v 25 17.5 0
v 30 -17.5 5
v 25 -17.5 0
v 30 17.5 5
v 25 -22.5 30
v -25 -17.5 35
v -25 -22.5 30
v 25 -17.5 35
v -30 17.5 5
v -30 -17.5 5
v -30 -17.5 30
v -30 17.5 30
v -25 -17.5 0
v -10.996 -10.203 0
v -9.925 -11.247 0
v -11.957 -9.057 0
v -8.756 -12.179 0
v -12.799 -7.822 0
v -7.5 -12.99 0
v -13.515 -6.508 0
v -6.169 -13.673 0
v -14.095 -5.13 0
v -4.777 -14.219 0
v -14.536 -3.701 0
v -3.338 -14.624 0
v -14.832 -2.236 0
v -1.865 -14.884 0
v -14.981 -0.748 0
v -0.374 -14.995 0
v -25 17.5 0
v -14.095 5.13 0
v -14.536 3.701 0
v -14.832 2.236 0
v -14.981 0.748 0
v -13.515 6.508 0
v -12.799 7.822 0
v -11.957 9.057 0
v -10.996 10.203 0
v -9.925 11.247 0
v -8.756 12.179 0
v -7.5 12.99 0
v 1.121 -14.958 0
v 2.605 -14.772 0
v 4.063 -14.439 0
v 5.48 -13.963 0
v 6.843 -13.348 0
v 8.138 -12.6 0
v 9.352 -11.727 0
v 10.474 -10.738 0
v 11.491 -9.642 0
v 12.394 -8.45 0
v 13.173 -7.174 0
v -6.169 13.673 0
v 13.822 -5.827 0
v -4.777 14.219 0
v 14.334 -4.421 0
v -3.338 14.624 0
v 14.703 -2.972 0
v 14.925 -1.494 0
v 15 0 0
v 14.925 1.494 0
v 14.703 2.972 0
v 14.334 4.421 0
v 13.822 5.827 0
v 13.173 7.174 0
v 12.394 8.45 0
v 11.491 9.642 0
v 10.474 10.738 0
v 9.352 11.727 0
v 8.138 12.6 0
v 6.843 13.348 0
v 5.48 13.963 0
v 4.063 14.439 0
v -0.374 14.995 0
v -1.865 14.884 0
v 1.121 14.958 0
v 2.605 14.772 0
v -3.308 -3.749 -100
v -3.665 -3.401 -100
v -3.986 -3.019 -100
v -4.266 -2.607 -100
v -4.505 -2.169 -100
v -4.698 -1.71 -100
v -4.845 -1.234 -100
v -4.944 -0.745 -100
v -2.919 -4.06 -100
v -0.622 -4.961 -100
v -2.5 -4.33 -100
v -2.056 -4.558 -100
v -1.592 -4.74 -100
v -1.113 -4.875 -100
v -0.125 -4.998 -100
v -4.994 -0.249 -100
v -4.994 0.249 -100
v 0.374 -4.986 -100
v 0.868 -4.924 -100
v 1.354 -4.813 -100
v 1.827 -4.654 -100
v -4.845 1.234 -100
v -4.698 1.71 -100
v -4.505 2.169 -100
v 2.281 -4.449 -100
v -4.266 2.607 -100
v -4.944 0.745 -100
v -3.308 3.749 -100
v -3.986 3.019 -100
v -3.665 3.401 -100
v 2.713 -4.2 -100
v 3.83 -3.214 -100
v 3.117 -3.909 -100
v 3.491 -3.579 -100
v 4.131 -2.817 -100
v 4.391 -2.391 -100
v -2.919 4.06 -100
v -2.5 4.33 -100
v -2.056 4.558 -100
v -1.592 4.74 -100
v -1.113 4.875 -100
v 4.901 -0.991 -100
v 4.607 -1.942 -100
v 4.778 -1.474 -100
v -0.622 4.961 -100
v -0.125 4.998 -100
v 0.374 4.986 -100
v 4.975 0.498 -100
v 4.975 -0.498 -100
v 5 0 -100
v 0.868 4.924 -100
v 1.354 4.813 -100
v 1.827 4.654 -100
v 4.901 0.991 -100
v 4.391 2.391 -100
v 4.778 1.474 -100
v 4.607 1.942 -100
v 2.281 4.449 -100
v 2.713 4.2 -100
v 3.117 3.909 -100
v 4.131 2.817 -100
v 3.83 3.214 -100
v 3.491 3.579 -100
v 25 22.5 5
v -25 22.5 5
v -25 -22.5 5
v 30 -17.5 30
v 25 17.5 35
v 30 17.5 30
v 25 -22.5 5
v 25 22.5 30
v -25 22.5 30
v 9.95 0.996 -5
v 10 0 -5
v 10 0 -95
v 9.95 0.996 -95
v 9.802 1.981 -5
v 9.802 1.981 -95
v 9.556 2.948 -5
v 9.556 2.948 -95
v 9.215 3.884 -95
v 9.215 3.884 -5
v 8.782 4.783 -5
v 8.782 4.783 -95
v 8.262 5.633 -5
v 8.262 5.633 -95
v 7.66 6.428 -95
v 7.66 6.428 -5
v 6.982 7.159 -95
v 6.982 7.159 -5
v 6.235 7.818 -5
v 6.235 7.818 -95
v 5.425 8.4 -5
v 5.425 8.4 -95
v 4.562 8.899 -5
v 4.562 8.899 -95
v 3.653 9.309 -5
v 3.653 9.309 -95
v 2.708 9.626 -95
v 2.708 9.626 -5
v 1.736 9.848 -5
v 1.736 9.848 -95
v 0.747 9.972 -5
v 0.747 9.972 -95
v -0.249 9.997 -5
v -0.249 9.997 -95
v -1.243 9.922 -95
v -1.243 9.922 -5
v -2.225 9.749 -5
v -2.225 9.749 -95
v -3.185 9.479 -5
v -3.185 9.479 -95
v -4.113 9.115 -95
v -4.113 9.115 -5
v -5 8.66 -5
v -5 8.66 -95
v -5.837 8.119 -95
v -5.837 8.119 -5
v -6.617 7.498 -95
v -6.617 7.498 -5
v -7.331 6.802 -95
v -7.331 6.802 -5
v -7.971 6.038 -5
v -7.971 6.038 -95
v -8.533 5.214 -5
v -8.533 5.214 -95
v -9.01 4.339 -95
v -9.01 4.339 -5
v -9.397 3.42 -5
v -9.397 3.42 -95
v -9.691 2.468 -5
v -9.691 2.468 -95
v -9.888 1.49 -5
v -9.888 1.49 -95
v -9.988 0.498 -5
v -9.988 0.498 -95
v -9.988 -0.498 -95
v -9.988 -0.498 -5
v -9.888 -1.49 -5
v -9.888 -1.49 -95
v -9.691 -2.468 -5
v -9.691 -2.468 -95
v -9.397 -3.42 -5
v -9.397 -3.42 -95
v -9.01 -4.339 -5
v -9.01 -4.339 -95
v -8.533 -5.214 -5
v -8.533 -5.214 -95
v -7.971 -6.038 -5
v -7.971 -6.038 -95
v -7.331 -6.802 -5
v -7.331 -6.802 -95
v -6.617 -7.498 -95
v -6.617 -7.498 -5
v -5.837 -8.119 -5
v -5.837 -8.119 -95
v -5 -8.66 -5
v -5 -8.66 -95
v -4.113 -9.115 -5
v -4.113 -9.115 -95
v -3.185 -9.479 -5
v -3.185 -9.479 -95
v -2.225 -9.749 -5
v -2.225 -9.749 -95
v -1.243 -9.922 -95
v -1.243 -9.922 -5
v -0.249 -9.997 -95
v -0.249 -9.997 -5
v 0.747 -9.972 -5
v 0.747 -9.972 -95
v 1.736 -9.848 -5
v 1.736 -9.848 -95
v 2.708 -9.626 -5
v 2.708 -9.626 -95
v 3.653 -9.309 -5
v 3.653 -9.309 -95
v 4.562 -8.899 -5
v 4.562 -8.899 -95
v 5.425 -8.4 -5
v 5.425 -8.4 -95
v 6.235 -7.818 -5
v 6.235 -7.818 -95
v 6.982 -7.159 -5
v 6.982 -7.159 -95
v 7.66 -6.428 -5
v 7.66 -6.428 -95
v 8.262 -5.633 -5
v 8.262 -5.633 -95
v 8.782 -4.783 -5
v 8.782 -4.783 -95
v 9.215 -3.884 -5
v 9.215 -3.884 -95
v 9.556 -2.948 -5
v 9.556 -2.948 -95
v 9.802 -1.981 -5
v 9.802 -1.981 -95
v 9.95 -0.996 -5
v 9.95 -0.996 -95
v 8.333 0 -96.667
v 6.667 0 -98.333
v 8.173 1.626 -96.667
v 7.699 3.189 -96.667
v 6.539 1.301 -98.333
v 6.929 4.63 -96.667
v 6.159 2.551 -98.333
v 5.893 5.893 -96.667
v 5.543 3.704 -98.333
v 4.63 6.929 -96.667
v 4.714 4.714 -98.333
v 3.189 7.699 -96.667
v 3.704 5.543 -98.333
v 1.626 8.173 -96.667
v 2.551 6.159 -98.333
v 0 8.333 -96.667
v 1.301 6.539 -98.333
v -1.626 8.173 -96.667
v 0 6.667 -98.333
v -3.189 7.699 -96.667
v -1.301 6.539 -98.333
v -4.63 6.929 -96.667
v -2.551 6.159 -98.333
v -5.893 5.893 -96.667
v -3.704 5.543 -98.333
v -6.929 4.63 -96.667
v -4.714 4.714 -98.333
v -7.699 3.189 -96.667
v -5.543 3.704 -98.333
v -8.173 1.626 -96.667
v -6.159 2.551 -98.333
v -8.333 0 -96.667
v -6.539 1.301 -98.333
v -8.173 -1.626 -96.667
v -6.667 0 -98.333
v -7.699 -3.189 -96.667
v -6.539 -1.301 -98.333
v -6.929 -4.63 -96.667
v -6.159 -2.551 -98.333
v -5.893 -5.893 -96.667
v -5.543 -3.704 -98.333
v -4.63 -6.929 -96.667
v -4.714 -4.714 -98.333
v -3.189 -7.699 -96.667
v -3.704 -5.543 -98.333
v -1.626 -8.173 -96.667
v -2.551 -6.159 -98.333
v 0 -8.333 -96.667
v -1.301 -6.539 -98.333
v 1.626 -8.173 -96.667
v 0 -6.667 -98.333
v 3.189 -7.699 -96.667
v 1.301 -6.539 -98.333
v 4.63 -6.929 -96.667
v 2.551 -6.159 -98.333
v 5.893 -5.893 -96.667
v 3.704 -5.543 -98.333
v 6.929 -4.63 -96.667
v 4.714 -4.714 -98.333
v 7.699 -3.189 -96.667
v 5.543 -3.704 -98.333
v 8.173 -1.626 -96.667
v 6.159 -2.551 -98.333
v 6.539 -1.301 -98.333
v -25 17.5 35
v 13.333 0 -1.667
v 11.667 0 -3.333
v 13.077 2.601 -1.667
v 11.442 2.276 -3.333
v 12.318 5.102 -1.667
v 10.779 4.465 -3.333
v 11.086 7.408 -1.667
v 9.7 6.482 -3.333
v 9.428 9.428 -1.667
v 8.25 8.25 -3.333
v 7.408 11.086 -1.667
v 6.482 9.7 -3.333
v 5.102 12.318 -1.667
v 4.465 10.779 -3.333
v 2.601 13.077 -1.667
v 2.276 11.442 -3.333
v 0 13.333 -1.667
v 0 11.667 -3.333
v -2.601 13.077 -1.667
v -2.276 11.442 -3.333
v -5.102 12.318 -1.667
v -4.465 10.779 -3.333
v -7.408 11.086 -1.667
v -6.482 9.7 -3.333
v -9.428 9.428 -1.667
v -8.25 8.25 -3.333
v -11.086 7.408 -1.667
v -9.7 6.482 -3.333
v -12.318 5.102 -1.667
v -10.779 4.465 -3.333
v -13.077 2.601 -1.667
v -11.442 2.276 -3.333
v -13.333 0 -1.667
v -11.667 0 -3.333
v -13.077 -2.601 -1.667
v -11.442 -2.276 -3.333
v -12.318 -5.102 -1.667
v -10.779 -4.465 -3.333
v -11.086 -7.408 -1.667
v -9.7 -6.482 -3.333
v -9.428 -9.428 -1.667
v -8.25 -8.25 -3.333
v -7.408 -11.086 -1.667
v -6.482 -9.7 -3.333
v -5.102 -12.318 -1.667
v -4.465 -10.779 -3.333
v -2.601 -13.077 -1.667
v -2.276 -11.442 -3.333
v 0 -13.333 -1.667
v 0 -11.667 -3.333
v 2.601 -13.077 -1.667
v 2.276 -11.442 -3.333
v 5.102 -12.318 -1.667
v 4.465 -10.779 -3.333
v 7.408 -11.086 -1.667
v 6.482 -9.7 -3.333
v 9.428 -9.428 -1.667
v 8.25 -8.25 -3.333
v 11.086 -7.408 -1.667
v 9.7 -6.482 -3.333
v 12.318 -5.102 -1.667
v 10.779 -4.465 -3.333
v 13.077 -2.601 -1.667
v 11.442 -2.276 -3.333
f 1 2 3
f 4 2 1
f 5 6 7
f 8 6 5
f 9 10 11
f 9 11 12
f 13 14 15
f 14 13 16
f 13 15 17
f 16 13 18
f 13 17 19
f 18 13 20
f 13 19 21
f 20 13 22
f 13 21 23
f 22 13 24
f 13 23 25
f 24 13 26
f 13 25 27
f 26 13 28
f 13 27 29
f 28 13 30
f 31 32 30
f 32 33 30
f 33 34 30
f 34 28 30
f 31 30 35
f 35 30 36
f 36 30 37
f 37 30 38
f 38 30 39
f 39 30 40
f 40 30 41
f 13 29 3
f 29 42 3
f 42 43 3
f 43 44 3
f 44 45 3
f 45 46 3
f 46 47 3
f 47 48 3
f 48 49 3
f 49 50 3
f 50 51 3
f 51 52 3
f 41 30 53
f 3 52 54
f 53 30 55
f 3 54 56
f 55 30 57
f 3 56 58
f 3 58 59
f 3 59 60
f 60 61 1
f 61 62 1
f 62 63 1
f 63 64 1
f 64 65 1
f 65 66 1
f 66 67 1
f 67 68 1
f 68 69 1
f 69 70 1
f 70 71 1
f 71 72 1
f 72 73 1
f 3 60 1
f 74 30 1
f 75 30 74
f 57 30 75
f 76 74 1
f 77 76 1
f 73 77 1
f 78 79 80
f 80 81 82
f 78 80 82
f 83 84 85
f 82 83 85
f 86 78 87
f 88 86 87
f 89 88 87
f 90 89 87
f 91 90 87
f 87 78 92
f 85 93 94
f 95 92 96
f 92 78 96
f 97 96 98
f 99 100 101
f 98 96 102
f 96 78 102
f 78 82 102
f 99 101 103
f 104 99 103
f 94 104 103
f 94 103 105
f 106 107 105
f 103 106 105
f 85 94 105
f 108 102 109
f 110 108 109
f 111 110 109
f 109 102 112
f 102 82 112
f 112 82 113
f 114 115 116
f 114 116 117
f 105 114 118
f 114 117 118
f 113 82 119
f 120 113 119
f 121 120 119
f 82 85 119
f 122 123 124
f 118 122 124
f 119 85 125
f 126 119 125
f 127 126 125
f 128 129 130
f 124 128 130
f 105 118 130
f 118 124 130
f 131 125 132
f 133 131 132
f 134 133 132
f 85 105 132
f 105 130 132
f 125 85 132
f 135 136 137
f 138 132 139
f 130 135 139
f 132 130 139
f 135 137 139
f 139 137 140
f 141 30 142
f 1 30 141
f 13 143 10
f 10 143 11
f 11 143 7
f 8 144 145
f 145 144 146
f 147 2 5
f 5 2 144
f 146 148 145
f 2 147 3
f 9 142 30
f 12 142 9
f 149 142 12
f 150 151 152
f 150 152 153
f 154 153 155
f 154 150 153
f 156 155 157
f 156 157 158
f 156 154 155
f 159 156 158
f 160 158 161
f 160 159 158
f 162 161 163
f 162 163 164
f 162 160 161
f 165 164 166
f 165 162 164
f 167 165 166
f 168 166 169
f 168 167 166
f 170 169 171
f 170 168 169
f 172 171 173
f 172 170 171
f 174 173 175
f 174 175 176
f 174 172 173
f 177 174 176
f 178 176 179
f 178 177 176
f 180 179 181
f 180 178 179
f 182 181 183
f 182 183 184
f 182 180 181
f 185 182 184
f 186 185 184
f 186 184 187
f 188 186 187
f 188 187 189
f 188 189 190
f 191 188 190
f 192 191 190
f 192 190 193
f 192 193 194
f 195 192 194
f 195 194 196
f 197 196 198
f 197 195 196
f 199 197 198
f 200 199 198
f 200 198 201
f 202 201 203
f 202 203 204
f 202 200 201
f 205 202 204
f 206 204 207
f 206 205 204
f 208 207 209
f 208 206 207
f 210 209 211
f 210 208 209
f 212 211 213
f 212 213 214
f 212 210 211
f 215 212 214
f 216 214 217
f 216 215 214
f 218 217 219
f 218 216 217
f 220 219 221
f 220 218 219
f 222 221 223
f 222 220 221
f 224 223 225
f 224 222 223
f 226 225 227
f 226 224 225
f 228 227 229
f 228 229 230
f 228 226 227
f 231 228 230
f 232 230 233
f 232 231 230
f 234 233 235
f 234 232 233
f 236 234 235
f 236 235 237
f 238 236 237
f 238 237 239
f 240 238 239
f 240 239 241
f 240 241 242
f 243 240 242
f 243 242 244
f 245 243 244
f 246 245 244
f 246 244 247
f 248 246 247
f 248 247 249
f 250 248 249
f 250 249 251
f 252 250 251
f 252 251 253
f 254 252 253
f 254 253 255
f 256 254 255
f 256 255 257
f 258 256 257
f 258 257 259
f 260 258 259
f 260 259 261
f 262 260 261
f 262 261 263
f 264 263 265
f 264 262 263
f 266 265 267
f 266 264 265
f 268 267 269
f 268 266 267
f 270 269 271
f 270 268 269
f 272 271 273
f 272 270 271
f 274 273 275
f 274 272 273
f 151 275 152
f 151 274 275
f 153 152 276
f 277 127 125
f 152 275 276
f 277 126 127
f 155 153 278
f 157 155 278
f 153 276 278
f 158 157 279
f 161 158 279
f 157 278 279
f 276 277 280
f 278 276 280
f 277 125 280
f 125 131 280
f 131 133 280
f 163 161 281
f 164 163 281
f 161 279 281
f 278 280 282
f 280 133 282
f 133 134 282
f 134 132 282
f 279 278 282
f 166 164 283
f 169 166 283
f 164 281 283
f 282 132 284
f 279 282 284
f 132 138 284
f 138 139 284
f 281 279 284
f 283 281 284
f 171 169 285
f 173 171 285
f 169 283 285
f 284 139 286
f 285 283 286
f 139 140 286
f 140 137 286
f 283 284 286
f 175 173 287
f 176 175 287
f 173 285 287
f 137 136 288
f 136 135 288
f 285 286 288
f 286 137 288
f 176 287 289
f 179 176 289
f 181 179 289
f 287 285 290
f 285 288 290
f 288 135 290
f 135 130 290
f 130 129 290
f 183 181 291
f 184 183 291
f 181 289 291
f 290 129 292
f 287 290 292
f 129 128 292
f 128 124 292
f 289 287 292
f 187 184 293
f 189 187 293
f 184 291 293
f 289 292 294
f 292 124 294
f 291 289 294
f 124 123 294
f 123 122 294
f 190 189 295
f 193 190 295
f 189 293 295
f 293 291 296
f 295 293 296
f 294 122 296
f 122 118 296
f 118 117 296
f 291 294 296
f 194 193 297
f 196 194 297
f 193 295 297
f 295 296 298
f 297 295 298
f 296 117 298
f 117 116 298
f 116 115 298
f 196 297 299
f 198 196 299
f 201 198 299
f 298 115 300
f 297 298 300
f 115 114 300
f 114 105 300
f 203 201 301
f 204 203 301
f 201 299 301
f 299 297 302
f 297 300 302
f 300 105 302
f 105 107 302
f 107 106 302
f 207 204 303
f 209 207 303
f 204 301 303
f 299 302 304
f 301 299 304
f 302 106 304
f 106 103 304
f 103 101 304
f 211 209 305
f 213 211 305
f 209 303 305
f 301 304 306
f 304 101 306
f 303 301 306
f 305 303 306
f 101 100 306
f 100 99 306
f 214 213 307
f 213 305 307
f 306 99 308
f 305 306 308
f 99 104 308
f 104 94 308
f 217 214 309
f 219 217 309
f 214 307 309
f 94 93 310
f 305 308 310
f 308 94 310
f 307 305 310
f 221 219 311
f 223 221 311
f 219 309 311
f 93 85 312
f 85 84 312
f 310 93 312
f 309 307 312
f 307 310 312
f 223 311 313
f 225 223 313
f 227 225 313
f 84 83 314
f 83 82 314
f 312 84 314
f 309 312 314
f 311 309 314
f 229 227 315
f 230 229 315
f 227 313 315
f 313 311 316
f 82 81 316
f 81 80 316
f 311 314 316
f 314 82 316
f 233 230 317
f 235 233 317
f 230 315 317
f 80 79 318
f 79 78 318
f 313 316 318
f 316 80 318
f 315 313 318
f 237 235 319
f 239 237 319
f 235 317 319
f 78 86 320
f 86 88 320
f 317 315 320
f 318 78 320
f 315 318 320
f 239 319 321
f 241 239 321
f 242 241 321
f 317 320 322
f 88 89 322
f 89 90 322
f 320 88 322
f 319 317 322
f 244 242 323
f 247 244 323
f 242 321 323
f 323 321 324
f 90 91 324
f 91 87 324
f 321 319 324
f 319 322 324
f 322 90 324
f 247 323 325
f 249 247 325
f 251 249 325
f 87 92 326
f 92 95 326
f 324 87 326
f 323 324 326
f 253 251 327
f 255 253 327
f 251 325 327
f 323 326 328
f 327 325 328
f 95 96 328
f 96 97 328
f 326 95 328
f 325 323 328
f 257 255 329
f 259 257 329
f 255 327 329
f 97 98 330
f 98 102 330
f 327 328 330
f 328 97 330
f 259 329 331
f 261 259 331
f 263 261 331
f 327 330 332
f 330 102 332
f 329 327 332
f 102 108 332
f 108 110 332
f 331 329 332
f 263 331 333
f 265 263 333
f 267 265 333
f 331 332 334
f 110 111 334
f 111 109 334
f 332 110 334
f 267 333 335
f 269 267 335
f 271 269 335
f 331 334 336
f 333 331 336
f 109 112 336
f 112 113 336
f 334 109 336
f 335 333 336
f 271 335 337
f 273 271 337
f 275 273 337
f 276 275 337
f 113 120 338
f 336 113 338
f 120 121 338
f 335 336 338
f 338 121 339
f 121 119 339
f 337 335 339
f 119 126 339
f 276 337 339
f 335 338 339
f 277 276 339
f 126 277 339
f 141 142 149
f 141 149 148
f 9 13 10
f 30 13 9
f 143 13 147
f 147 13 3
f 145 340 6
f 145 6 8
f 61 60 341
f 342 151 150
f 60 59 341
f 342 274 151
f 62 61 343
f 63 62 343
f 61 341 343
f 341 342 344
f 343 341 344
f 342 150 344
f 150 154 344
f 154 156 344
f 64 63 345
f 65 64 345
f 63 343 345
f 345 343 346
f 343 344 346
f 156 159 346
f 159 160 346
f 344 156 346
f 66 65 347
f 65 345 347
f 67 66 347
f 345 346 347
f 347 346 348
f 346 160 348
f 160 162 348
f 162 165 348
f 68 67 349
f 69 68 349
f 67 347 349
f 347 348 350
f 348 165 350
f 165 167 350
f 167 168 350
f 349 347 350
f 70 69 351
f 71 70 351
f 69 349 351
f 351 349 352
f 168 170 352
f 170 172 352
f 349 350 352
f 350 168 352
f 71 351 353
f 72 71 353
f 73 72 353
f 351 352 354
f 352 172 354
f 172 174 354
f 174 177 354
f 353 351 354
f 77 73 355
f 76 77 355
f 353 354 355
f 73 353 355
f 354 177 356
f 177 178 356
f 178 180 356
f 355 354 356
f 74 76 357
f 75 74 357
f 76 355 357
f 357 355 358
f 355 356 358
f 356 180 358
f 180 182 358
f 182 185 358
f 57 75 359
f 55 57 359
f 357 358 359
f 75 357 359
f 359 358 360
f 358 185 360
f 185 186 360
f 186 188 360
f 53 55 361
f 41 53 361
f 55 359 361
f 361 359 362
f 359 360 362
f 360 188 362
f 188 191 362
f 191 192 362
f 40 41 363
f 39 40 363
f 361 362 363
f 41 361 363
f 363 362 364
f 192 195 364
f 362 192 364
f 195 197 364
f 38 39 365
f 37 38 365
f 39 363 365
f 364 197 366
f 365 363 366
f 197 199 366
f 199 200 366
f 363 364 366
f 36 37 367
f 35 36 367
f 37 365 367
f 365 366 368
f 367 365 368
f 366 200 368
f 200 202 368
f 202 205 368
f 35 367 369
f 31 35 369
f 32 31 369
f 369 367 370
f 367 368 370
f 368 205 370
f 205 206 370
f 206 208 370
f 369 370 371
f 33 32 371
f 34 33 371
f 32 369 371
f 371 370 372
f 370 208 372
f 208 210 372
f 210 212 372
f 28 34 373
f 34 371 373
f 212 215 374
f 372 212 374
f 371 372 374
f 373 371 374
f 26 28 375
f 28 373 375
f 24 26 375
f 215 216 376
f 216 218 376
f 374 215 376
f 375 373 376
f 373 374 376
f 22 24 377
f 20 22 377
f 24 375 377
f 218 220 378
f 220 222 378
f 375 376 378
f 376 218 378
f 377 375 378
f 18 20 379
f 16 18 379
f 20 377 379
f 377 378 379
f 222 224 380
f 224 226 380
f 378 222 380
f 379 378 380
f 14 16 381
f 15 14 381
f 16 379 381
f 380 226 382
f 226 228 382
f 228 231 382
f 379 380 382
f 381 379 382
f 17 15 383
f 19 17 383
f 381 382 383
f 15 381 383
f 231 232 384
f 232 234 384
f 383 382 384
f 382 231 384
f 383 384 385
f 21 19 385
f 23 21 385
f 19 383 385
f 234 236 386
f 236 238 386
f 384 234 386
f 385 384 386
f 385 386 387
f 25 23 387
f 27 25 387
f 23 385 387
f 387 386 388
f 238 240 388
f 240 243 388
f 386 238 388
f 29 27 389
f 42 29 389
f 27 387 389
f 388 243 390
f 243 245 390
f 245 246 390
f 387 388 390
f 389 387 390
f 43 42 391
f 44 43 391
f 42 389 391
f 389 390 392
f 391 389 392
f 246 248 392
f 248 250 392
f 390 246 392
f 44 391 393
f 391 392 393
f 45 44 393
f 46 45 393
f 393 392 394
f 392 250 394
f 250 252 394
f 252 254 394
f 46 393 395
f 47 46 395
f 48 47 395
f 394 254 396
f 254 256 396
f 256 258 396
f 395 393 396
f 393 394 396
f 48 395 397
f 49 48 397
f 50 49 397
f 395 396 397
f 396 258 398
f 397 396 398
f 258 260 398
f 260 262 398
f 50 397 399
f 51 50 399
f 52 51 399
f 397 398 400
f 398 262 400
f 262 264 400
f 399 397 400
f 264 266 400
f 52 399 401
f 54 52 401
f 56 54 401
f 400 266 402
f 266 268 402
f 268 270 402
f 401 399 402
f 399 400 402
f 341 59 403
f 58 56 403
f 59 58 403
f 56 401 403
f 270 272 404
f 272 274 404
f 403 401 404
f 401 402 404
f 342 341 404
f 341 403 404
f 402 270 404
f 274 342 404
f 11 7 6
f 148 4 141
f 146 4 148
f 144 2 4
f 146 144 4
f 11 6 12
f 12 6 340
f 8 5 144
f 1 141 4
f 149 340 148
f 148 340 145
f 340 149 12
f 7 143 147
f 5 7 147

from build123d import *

# Parameters (mm, degrees)
F0_W     = 60
F0_H     = 45
F0_R     = 10
F1_DEPTH = 35
F2_DEPTH = 100
F3_SIZE  = 5
F4_SIZE  = 5


with BuildPart() as f1:
    # F0 (on Top) → F1 (new body)
    with BuildSketch(Plane.XY):
        Rectangle(F0_W, F0_H)
        Circle(F0_R, mode=Mode.SUBTRACT)
        Circle(F0_R)
    extrude(amount=F1_DEPTH)

    # F0 (on Top) → F2 (join)
    with BuildSketch(Plane.XY):
        Circle(F0_R)
    extrude(amount=-F2_DEPTH)

    # F3
    f3_edges = [f1.edges().sort_by_distance(p)[0] for p in [
        (-30, -22.5, 17.5),
        (30, -22.5, 17.5),
        (30, 22.5, 17.5),
        (-30, 22.5, 17.5),
        (0, 22.5, 35),
        (0, 22.5, 0),
        (0, -22.5, 35),
        (0, -22.5, 0),
        (-30, 0, 0),
        (-30, 0, 35),
        (30, 0, 35),
        (30, 0, 0),
    ]]
    chamfer(f3_edges, length=F3_SIZE)

    # F4
    f4_edges = [f1.edges().sort_by_distance(p)[0] for p in [
        (10, 0, -50),
        (-10, 0, 0),
        (-10, 0, -100),
    ]]
    chamfer(f4_edges, length=F4_SIZE)


solid = f1.part
